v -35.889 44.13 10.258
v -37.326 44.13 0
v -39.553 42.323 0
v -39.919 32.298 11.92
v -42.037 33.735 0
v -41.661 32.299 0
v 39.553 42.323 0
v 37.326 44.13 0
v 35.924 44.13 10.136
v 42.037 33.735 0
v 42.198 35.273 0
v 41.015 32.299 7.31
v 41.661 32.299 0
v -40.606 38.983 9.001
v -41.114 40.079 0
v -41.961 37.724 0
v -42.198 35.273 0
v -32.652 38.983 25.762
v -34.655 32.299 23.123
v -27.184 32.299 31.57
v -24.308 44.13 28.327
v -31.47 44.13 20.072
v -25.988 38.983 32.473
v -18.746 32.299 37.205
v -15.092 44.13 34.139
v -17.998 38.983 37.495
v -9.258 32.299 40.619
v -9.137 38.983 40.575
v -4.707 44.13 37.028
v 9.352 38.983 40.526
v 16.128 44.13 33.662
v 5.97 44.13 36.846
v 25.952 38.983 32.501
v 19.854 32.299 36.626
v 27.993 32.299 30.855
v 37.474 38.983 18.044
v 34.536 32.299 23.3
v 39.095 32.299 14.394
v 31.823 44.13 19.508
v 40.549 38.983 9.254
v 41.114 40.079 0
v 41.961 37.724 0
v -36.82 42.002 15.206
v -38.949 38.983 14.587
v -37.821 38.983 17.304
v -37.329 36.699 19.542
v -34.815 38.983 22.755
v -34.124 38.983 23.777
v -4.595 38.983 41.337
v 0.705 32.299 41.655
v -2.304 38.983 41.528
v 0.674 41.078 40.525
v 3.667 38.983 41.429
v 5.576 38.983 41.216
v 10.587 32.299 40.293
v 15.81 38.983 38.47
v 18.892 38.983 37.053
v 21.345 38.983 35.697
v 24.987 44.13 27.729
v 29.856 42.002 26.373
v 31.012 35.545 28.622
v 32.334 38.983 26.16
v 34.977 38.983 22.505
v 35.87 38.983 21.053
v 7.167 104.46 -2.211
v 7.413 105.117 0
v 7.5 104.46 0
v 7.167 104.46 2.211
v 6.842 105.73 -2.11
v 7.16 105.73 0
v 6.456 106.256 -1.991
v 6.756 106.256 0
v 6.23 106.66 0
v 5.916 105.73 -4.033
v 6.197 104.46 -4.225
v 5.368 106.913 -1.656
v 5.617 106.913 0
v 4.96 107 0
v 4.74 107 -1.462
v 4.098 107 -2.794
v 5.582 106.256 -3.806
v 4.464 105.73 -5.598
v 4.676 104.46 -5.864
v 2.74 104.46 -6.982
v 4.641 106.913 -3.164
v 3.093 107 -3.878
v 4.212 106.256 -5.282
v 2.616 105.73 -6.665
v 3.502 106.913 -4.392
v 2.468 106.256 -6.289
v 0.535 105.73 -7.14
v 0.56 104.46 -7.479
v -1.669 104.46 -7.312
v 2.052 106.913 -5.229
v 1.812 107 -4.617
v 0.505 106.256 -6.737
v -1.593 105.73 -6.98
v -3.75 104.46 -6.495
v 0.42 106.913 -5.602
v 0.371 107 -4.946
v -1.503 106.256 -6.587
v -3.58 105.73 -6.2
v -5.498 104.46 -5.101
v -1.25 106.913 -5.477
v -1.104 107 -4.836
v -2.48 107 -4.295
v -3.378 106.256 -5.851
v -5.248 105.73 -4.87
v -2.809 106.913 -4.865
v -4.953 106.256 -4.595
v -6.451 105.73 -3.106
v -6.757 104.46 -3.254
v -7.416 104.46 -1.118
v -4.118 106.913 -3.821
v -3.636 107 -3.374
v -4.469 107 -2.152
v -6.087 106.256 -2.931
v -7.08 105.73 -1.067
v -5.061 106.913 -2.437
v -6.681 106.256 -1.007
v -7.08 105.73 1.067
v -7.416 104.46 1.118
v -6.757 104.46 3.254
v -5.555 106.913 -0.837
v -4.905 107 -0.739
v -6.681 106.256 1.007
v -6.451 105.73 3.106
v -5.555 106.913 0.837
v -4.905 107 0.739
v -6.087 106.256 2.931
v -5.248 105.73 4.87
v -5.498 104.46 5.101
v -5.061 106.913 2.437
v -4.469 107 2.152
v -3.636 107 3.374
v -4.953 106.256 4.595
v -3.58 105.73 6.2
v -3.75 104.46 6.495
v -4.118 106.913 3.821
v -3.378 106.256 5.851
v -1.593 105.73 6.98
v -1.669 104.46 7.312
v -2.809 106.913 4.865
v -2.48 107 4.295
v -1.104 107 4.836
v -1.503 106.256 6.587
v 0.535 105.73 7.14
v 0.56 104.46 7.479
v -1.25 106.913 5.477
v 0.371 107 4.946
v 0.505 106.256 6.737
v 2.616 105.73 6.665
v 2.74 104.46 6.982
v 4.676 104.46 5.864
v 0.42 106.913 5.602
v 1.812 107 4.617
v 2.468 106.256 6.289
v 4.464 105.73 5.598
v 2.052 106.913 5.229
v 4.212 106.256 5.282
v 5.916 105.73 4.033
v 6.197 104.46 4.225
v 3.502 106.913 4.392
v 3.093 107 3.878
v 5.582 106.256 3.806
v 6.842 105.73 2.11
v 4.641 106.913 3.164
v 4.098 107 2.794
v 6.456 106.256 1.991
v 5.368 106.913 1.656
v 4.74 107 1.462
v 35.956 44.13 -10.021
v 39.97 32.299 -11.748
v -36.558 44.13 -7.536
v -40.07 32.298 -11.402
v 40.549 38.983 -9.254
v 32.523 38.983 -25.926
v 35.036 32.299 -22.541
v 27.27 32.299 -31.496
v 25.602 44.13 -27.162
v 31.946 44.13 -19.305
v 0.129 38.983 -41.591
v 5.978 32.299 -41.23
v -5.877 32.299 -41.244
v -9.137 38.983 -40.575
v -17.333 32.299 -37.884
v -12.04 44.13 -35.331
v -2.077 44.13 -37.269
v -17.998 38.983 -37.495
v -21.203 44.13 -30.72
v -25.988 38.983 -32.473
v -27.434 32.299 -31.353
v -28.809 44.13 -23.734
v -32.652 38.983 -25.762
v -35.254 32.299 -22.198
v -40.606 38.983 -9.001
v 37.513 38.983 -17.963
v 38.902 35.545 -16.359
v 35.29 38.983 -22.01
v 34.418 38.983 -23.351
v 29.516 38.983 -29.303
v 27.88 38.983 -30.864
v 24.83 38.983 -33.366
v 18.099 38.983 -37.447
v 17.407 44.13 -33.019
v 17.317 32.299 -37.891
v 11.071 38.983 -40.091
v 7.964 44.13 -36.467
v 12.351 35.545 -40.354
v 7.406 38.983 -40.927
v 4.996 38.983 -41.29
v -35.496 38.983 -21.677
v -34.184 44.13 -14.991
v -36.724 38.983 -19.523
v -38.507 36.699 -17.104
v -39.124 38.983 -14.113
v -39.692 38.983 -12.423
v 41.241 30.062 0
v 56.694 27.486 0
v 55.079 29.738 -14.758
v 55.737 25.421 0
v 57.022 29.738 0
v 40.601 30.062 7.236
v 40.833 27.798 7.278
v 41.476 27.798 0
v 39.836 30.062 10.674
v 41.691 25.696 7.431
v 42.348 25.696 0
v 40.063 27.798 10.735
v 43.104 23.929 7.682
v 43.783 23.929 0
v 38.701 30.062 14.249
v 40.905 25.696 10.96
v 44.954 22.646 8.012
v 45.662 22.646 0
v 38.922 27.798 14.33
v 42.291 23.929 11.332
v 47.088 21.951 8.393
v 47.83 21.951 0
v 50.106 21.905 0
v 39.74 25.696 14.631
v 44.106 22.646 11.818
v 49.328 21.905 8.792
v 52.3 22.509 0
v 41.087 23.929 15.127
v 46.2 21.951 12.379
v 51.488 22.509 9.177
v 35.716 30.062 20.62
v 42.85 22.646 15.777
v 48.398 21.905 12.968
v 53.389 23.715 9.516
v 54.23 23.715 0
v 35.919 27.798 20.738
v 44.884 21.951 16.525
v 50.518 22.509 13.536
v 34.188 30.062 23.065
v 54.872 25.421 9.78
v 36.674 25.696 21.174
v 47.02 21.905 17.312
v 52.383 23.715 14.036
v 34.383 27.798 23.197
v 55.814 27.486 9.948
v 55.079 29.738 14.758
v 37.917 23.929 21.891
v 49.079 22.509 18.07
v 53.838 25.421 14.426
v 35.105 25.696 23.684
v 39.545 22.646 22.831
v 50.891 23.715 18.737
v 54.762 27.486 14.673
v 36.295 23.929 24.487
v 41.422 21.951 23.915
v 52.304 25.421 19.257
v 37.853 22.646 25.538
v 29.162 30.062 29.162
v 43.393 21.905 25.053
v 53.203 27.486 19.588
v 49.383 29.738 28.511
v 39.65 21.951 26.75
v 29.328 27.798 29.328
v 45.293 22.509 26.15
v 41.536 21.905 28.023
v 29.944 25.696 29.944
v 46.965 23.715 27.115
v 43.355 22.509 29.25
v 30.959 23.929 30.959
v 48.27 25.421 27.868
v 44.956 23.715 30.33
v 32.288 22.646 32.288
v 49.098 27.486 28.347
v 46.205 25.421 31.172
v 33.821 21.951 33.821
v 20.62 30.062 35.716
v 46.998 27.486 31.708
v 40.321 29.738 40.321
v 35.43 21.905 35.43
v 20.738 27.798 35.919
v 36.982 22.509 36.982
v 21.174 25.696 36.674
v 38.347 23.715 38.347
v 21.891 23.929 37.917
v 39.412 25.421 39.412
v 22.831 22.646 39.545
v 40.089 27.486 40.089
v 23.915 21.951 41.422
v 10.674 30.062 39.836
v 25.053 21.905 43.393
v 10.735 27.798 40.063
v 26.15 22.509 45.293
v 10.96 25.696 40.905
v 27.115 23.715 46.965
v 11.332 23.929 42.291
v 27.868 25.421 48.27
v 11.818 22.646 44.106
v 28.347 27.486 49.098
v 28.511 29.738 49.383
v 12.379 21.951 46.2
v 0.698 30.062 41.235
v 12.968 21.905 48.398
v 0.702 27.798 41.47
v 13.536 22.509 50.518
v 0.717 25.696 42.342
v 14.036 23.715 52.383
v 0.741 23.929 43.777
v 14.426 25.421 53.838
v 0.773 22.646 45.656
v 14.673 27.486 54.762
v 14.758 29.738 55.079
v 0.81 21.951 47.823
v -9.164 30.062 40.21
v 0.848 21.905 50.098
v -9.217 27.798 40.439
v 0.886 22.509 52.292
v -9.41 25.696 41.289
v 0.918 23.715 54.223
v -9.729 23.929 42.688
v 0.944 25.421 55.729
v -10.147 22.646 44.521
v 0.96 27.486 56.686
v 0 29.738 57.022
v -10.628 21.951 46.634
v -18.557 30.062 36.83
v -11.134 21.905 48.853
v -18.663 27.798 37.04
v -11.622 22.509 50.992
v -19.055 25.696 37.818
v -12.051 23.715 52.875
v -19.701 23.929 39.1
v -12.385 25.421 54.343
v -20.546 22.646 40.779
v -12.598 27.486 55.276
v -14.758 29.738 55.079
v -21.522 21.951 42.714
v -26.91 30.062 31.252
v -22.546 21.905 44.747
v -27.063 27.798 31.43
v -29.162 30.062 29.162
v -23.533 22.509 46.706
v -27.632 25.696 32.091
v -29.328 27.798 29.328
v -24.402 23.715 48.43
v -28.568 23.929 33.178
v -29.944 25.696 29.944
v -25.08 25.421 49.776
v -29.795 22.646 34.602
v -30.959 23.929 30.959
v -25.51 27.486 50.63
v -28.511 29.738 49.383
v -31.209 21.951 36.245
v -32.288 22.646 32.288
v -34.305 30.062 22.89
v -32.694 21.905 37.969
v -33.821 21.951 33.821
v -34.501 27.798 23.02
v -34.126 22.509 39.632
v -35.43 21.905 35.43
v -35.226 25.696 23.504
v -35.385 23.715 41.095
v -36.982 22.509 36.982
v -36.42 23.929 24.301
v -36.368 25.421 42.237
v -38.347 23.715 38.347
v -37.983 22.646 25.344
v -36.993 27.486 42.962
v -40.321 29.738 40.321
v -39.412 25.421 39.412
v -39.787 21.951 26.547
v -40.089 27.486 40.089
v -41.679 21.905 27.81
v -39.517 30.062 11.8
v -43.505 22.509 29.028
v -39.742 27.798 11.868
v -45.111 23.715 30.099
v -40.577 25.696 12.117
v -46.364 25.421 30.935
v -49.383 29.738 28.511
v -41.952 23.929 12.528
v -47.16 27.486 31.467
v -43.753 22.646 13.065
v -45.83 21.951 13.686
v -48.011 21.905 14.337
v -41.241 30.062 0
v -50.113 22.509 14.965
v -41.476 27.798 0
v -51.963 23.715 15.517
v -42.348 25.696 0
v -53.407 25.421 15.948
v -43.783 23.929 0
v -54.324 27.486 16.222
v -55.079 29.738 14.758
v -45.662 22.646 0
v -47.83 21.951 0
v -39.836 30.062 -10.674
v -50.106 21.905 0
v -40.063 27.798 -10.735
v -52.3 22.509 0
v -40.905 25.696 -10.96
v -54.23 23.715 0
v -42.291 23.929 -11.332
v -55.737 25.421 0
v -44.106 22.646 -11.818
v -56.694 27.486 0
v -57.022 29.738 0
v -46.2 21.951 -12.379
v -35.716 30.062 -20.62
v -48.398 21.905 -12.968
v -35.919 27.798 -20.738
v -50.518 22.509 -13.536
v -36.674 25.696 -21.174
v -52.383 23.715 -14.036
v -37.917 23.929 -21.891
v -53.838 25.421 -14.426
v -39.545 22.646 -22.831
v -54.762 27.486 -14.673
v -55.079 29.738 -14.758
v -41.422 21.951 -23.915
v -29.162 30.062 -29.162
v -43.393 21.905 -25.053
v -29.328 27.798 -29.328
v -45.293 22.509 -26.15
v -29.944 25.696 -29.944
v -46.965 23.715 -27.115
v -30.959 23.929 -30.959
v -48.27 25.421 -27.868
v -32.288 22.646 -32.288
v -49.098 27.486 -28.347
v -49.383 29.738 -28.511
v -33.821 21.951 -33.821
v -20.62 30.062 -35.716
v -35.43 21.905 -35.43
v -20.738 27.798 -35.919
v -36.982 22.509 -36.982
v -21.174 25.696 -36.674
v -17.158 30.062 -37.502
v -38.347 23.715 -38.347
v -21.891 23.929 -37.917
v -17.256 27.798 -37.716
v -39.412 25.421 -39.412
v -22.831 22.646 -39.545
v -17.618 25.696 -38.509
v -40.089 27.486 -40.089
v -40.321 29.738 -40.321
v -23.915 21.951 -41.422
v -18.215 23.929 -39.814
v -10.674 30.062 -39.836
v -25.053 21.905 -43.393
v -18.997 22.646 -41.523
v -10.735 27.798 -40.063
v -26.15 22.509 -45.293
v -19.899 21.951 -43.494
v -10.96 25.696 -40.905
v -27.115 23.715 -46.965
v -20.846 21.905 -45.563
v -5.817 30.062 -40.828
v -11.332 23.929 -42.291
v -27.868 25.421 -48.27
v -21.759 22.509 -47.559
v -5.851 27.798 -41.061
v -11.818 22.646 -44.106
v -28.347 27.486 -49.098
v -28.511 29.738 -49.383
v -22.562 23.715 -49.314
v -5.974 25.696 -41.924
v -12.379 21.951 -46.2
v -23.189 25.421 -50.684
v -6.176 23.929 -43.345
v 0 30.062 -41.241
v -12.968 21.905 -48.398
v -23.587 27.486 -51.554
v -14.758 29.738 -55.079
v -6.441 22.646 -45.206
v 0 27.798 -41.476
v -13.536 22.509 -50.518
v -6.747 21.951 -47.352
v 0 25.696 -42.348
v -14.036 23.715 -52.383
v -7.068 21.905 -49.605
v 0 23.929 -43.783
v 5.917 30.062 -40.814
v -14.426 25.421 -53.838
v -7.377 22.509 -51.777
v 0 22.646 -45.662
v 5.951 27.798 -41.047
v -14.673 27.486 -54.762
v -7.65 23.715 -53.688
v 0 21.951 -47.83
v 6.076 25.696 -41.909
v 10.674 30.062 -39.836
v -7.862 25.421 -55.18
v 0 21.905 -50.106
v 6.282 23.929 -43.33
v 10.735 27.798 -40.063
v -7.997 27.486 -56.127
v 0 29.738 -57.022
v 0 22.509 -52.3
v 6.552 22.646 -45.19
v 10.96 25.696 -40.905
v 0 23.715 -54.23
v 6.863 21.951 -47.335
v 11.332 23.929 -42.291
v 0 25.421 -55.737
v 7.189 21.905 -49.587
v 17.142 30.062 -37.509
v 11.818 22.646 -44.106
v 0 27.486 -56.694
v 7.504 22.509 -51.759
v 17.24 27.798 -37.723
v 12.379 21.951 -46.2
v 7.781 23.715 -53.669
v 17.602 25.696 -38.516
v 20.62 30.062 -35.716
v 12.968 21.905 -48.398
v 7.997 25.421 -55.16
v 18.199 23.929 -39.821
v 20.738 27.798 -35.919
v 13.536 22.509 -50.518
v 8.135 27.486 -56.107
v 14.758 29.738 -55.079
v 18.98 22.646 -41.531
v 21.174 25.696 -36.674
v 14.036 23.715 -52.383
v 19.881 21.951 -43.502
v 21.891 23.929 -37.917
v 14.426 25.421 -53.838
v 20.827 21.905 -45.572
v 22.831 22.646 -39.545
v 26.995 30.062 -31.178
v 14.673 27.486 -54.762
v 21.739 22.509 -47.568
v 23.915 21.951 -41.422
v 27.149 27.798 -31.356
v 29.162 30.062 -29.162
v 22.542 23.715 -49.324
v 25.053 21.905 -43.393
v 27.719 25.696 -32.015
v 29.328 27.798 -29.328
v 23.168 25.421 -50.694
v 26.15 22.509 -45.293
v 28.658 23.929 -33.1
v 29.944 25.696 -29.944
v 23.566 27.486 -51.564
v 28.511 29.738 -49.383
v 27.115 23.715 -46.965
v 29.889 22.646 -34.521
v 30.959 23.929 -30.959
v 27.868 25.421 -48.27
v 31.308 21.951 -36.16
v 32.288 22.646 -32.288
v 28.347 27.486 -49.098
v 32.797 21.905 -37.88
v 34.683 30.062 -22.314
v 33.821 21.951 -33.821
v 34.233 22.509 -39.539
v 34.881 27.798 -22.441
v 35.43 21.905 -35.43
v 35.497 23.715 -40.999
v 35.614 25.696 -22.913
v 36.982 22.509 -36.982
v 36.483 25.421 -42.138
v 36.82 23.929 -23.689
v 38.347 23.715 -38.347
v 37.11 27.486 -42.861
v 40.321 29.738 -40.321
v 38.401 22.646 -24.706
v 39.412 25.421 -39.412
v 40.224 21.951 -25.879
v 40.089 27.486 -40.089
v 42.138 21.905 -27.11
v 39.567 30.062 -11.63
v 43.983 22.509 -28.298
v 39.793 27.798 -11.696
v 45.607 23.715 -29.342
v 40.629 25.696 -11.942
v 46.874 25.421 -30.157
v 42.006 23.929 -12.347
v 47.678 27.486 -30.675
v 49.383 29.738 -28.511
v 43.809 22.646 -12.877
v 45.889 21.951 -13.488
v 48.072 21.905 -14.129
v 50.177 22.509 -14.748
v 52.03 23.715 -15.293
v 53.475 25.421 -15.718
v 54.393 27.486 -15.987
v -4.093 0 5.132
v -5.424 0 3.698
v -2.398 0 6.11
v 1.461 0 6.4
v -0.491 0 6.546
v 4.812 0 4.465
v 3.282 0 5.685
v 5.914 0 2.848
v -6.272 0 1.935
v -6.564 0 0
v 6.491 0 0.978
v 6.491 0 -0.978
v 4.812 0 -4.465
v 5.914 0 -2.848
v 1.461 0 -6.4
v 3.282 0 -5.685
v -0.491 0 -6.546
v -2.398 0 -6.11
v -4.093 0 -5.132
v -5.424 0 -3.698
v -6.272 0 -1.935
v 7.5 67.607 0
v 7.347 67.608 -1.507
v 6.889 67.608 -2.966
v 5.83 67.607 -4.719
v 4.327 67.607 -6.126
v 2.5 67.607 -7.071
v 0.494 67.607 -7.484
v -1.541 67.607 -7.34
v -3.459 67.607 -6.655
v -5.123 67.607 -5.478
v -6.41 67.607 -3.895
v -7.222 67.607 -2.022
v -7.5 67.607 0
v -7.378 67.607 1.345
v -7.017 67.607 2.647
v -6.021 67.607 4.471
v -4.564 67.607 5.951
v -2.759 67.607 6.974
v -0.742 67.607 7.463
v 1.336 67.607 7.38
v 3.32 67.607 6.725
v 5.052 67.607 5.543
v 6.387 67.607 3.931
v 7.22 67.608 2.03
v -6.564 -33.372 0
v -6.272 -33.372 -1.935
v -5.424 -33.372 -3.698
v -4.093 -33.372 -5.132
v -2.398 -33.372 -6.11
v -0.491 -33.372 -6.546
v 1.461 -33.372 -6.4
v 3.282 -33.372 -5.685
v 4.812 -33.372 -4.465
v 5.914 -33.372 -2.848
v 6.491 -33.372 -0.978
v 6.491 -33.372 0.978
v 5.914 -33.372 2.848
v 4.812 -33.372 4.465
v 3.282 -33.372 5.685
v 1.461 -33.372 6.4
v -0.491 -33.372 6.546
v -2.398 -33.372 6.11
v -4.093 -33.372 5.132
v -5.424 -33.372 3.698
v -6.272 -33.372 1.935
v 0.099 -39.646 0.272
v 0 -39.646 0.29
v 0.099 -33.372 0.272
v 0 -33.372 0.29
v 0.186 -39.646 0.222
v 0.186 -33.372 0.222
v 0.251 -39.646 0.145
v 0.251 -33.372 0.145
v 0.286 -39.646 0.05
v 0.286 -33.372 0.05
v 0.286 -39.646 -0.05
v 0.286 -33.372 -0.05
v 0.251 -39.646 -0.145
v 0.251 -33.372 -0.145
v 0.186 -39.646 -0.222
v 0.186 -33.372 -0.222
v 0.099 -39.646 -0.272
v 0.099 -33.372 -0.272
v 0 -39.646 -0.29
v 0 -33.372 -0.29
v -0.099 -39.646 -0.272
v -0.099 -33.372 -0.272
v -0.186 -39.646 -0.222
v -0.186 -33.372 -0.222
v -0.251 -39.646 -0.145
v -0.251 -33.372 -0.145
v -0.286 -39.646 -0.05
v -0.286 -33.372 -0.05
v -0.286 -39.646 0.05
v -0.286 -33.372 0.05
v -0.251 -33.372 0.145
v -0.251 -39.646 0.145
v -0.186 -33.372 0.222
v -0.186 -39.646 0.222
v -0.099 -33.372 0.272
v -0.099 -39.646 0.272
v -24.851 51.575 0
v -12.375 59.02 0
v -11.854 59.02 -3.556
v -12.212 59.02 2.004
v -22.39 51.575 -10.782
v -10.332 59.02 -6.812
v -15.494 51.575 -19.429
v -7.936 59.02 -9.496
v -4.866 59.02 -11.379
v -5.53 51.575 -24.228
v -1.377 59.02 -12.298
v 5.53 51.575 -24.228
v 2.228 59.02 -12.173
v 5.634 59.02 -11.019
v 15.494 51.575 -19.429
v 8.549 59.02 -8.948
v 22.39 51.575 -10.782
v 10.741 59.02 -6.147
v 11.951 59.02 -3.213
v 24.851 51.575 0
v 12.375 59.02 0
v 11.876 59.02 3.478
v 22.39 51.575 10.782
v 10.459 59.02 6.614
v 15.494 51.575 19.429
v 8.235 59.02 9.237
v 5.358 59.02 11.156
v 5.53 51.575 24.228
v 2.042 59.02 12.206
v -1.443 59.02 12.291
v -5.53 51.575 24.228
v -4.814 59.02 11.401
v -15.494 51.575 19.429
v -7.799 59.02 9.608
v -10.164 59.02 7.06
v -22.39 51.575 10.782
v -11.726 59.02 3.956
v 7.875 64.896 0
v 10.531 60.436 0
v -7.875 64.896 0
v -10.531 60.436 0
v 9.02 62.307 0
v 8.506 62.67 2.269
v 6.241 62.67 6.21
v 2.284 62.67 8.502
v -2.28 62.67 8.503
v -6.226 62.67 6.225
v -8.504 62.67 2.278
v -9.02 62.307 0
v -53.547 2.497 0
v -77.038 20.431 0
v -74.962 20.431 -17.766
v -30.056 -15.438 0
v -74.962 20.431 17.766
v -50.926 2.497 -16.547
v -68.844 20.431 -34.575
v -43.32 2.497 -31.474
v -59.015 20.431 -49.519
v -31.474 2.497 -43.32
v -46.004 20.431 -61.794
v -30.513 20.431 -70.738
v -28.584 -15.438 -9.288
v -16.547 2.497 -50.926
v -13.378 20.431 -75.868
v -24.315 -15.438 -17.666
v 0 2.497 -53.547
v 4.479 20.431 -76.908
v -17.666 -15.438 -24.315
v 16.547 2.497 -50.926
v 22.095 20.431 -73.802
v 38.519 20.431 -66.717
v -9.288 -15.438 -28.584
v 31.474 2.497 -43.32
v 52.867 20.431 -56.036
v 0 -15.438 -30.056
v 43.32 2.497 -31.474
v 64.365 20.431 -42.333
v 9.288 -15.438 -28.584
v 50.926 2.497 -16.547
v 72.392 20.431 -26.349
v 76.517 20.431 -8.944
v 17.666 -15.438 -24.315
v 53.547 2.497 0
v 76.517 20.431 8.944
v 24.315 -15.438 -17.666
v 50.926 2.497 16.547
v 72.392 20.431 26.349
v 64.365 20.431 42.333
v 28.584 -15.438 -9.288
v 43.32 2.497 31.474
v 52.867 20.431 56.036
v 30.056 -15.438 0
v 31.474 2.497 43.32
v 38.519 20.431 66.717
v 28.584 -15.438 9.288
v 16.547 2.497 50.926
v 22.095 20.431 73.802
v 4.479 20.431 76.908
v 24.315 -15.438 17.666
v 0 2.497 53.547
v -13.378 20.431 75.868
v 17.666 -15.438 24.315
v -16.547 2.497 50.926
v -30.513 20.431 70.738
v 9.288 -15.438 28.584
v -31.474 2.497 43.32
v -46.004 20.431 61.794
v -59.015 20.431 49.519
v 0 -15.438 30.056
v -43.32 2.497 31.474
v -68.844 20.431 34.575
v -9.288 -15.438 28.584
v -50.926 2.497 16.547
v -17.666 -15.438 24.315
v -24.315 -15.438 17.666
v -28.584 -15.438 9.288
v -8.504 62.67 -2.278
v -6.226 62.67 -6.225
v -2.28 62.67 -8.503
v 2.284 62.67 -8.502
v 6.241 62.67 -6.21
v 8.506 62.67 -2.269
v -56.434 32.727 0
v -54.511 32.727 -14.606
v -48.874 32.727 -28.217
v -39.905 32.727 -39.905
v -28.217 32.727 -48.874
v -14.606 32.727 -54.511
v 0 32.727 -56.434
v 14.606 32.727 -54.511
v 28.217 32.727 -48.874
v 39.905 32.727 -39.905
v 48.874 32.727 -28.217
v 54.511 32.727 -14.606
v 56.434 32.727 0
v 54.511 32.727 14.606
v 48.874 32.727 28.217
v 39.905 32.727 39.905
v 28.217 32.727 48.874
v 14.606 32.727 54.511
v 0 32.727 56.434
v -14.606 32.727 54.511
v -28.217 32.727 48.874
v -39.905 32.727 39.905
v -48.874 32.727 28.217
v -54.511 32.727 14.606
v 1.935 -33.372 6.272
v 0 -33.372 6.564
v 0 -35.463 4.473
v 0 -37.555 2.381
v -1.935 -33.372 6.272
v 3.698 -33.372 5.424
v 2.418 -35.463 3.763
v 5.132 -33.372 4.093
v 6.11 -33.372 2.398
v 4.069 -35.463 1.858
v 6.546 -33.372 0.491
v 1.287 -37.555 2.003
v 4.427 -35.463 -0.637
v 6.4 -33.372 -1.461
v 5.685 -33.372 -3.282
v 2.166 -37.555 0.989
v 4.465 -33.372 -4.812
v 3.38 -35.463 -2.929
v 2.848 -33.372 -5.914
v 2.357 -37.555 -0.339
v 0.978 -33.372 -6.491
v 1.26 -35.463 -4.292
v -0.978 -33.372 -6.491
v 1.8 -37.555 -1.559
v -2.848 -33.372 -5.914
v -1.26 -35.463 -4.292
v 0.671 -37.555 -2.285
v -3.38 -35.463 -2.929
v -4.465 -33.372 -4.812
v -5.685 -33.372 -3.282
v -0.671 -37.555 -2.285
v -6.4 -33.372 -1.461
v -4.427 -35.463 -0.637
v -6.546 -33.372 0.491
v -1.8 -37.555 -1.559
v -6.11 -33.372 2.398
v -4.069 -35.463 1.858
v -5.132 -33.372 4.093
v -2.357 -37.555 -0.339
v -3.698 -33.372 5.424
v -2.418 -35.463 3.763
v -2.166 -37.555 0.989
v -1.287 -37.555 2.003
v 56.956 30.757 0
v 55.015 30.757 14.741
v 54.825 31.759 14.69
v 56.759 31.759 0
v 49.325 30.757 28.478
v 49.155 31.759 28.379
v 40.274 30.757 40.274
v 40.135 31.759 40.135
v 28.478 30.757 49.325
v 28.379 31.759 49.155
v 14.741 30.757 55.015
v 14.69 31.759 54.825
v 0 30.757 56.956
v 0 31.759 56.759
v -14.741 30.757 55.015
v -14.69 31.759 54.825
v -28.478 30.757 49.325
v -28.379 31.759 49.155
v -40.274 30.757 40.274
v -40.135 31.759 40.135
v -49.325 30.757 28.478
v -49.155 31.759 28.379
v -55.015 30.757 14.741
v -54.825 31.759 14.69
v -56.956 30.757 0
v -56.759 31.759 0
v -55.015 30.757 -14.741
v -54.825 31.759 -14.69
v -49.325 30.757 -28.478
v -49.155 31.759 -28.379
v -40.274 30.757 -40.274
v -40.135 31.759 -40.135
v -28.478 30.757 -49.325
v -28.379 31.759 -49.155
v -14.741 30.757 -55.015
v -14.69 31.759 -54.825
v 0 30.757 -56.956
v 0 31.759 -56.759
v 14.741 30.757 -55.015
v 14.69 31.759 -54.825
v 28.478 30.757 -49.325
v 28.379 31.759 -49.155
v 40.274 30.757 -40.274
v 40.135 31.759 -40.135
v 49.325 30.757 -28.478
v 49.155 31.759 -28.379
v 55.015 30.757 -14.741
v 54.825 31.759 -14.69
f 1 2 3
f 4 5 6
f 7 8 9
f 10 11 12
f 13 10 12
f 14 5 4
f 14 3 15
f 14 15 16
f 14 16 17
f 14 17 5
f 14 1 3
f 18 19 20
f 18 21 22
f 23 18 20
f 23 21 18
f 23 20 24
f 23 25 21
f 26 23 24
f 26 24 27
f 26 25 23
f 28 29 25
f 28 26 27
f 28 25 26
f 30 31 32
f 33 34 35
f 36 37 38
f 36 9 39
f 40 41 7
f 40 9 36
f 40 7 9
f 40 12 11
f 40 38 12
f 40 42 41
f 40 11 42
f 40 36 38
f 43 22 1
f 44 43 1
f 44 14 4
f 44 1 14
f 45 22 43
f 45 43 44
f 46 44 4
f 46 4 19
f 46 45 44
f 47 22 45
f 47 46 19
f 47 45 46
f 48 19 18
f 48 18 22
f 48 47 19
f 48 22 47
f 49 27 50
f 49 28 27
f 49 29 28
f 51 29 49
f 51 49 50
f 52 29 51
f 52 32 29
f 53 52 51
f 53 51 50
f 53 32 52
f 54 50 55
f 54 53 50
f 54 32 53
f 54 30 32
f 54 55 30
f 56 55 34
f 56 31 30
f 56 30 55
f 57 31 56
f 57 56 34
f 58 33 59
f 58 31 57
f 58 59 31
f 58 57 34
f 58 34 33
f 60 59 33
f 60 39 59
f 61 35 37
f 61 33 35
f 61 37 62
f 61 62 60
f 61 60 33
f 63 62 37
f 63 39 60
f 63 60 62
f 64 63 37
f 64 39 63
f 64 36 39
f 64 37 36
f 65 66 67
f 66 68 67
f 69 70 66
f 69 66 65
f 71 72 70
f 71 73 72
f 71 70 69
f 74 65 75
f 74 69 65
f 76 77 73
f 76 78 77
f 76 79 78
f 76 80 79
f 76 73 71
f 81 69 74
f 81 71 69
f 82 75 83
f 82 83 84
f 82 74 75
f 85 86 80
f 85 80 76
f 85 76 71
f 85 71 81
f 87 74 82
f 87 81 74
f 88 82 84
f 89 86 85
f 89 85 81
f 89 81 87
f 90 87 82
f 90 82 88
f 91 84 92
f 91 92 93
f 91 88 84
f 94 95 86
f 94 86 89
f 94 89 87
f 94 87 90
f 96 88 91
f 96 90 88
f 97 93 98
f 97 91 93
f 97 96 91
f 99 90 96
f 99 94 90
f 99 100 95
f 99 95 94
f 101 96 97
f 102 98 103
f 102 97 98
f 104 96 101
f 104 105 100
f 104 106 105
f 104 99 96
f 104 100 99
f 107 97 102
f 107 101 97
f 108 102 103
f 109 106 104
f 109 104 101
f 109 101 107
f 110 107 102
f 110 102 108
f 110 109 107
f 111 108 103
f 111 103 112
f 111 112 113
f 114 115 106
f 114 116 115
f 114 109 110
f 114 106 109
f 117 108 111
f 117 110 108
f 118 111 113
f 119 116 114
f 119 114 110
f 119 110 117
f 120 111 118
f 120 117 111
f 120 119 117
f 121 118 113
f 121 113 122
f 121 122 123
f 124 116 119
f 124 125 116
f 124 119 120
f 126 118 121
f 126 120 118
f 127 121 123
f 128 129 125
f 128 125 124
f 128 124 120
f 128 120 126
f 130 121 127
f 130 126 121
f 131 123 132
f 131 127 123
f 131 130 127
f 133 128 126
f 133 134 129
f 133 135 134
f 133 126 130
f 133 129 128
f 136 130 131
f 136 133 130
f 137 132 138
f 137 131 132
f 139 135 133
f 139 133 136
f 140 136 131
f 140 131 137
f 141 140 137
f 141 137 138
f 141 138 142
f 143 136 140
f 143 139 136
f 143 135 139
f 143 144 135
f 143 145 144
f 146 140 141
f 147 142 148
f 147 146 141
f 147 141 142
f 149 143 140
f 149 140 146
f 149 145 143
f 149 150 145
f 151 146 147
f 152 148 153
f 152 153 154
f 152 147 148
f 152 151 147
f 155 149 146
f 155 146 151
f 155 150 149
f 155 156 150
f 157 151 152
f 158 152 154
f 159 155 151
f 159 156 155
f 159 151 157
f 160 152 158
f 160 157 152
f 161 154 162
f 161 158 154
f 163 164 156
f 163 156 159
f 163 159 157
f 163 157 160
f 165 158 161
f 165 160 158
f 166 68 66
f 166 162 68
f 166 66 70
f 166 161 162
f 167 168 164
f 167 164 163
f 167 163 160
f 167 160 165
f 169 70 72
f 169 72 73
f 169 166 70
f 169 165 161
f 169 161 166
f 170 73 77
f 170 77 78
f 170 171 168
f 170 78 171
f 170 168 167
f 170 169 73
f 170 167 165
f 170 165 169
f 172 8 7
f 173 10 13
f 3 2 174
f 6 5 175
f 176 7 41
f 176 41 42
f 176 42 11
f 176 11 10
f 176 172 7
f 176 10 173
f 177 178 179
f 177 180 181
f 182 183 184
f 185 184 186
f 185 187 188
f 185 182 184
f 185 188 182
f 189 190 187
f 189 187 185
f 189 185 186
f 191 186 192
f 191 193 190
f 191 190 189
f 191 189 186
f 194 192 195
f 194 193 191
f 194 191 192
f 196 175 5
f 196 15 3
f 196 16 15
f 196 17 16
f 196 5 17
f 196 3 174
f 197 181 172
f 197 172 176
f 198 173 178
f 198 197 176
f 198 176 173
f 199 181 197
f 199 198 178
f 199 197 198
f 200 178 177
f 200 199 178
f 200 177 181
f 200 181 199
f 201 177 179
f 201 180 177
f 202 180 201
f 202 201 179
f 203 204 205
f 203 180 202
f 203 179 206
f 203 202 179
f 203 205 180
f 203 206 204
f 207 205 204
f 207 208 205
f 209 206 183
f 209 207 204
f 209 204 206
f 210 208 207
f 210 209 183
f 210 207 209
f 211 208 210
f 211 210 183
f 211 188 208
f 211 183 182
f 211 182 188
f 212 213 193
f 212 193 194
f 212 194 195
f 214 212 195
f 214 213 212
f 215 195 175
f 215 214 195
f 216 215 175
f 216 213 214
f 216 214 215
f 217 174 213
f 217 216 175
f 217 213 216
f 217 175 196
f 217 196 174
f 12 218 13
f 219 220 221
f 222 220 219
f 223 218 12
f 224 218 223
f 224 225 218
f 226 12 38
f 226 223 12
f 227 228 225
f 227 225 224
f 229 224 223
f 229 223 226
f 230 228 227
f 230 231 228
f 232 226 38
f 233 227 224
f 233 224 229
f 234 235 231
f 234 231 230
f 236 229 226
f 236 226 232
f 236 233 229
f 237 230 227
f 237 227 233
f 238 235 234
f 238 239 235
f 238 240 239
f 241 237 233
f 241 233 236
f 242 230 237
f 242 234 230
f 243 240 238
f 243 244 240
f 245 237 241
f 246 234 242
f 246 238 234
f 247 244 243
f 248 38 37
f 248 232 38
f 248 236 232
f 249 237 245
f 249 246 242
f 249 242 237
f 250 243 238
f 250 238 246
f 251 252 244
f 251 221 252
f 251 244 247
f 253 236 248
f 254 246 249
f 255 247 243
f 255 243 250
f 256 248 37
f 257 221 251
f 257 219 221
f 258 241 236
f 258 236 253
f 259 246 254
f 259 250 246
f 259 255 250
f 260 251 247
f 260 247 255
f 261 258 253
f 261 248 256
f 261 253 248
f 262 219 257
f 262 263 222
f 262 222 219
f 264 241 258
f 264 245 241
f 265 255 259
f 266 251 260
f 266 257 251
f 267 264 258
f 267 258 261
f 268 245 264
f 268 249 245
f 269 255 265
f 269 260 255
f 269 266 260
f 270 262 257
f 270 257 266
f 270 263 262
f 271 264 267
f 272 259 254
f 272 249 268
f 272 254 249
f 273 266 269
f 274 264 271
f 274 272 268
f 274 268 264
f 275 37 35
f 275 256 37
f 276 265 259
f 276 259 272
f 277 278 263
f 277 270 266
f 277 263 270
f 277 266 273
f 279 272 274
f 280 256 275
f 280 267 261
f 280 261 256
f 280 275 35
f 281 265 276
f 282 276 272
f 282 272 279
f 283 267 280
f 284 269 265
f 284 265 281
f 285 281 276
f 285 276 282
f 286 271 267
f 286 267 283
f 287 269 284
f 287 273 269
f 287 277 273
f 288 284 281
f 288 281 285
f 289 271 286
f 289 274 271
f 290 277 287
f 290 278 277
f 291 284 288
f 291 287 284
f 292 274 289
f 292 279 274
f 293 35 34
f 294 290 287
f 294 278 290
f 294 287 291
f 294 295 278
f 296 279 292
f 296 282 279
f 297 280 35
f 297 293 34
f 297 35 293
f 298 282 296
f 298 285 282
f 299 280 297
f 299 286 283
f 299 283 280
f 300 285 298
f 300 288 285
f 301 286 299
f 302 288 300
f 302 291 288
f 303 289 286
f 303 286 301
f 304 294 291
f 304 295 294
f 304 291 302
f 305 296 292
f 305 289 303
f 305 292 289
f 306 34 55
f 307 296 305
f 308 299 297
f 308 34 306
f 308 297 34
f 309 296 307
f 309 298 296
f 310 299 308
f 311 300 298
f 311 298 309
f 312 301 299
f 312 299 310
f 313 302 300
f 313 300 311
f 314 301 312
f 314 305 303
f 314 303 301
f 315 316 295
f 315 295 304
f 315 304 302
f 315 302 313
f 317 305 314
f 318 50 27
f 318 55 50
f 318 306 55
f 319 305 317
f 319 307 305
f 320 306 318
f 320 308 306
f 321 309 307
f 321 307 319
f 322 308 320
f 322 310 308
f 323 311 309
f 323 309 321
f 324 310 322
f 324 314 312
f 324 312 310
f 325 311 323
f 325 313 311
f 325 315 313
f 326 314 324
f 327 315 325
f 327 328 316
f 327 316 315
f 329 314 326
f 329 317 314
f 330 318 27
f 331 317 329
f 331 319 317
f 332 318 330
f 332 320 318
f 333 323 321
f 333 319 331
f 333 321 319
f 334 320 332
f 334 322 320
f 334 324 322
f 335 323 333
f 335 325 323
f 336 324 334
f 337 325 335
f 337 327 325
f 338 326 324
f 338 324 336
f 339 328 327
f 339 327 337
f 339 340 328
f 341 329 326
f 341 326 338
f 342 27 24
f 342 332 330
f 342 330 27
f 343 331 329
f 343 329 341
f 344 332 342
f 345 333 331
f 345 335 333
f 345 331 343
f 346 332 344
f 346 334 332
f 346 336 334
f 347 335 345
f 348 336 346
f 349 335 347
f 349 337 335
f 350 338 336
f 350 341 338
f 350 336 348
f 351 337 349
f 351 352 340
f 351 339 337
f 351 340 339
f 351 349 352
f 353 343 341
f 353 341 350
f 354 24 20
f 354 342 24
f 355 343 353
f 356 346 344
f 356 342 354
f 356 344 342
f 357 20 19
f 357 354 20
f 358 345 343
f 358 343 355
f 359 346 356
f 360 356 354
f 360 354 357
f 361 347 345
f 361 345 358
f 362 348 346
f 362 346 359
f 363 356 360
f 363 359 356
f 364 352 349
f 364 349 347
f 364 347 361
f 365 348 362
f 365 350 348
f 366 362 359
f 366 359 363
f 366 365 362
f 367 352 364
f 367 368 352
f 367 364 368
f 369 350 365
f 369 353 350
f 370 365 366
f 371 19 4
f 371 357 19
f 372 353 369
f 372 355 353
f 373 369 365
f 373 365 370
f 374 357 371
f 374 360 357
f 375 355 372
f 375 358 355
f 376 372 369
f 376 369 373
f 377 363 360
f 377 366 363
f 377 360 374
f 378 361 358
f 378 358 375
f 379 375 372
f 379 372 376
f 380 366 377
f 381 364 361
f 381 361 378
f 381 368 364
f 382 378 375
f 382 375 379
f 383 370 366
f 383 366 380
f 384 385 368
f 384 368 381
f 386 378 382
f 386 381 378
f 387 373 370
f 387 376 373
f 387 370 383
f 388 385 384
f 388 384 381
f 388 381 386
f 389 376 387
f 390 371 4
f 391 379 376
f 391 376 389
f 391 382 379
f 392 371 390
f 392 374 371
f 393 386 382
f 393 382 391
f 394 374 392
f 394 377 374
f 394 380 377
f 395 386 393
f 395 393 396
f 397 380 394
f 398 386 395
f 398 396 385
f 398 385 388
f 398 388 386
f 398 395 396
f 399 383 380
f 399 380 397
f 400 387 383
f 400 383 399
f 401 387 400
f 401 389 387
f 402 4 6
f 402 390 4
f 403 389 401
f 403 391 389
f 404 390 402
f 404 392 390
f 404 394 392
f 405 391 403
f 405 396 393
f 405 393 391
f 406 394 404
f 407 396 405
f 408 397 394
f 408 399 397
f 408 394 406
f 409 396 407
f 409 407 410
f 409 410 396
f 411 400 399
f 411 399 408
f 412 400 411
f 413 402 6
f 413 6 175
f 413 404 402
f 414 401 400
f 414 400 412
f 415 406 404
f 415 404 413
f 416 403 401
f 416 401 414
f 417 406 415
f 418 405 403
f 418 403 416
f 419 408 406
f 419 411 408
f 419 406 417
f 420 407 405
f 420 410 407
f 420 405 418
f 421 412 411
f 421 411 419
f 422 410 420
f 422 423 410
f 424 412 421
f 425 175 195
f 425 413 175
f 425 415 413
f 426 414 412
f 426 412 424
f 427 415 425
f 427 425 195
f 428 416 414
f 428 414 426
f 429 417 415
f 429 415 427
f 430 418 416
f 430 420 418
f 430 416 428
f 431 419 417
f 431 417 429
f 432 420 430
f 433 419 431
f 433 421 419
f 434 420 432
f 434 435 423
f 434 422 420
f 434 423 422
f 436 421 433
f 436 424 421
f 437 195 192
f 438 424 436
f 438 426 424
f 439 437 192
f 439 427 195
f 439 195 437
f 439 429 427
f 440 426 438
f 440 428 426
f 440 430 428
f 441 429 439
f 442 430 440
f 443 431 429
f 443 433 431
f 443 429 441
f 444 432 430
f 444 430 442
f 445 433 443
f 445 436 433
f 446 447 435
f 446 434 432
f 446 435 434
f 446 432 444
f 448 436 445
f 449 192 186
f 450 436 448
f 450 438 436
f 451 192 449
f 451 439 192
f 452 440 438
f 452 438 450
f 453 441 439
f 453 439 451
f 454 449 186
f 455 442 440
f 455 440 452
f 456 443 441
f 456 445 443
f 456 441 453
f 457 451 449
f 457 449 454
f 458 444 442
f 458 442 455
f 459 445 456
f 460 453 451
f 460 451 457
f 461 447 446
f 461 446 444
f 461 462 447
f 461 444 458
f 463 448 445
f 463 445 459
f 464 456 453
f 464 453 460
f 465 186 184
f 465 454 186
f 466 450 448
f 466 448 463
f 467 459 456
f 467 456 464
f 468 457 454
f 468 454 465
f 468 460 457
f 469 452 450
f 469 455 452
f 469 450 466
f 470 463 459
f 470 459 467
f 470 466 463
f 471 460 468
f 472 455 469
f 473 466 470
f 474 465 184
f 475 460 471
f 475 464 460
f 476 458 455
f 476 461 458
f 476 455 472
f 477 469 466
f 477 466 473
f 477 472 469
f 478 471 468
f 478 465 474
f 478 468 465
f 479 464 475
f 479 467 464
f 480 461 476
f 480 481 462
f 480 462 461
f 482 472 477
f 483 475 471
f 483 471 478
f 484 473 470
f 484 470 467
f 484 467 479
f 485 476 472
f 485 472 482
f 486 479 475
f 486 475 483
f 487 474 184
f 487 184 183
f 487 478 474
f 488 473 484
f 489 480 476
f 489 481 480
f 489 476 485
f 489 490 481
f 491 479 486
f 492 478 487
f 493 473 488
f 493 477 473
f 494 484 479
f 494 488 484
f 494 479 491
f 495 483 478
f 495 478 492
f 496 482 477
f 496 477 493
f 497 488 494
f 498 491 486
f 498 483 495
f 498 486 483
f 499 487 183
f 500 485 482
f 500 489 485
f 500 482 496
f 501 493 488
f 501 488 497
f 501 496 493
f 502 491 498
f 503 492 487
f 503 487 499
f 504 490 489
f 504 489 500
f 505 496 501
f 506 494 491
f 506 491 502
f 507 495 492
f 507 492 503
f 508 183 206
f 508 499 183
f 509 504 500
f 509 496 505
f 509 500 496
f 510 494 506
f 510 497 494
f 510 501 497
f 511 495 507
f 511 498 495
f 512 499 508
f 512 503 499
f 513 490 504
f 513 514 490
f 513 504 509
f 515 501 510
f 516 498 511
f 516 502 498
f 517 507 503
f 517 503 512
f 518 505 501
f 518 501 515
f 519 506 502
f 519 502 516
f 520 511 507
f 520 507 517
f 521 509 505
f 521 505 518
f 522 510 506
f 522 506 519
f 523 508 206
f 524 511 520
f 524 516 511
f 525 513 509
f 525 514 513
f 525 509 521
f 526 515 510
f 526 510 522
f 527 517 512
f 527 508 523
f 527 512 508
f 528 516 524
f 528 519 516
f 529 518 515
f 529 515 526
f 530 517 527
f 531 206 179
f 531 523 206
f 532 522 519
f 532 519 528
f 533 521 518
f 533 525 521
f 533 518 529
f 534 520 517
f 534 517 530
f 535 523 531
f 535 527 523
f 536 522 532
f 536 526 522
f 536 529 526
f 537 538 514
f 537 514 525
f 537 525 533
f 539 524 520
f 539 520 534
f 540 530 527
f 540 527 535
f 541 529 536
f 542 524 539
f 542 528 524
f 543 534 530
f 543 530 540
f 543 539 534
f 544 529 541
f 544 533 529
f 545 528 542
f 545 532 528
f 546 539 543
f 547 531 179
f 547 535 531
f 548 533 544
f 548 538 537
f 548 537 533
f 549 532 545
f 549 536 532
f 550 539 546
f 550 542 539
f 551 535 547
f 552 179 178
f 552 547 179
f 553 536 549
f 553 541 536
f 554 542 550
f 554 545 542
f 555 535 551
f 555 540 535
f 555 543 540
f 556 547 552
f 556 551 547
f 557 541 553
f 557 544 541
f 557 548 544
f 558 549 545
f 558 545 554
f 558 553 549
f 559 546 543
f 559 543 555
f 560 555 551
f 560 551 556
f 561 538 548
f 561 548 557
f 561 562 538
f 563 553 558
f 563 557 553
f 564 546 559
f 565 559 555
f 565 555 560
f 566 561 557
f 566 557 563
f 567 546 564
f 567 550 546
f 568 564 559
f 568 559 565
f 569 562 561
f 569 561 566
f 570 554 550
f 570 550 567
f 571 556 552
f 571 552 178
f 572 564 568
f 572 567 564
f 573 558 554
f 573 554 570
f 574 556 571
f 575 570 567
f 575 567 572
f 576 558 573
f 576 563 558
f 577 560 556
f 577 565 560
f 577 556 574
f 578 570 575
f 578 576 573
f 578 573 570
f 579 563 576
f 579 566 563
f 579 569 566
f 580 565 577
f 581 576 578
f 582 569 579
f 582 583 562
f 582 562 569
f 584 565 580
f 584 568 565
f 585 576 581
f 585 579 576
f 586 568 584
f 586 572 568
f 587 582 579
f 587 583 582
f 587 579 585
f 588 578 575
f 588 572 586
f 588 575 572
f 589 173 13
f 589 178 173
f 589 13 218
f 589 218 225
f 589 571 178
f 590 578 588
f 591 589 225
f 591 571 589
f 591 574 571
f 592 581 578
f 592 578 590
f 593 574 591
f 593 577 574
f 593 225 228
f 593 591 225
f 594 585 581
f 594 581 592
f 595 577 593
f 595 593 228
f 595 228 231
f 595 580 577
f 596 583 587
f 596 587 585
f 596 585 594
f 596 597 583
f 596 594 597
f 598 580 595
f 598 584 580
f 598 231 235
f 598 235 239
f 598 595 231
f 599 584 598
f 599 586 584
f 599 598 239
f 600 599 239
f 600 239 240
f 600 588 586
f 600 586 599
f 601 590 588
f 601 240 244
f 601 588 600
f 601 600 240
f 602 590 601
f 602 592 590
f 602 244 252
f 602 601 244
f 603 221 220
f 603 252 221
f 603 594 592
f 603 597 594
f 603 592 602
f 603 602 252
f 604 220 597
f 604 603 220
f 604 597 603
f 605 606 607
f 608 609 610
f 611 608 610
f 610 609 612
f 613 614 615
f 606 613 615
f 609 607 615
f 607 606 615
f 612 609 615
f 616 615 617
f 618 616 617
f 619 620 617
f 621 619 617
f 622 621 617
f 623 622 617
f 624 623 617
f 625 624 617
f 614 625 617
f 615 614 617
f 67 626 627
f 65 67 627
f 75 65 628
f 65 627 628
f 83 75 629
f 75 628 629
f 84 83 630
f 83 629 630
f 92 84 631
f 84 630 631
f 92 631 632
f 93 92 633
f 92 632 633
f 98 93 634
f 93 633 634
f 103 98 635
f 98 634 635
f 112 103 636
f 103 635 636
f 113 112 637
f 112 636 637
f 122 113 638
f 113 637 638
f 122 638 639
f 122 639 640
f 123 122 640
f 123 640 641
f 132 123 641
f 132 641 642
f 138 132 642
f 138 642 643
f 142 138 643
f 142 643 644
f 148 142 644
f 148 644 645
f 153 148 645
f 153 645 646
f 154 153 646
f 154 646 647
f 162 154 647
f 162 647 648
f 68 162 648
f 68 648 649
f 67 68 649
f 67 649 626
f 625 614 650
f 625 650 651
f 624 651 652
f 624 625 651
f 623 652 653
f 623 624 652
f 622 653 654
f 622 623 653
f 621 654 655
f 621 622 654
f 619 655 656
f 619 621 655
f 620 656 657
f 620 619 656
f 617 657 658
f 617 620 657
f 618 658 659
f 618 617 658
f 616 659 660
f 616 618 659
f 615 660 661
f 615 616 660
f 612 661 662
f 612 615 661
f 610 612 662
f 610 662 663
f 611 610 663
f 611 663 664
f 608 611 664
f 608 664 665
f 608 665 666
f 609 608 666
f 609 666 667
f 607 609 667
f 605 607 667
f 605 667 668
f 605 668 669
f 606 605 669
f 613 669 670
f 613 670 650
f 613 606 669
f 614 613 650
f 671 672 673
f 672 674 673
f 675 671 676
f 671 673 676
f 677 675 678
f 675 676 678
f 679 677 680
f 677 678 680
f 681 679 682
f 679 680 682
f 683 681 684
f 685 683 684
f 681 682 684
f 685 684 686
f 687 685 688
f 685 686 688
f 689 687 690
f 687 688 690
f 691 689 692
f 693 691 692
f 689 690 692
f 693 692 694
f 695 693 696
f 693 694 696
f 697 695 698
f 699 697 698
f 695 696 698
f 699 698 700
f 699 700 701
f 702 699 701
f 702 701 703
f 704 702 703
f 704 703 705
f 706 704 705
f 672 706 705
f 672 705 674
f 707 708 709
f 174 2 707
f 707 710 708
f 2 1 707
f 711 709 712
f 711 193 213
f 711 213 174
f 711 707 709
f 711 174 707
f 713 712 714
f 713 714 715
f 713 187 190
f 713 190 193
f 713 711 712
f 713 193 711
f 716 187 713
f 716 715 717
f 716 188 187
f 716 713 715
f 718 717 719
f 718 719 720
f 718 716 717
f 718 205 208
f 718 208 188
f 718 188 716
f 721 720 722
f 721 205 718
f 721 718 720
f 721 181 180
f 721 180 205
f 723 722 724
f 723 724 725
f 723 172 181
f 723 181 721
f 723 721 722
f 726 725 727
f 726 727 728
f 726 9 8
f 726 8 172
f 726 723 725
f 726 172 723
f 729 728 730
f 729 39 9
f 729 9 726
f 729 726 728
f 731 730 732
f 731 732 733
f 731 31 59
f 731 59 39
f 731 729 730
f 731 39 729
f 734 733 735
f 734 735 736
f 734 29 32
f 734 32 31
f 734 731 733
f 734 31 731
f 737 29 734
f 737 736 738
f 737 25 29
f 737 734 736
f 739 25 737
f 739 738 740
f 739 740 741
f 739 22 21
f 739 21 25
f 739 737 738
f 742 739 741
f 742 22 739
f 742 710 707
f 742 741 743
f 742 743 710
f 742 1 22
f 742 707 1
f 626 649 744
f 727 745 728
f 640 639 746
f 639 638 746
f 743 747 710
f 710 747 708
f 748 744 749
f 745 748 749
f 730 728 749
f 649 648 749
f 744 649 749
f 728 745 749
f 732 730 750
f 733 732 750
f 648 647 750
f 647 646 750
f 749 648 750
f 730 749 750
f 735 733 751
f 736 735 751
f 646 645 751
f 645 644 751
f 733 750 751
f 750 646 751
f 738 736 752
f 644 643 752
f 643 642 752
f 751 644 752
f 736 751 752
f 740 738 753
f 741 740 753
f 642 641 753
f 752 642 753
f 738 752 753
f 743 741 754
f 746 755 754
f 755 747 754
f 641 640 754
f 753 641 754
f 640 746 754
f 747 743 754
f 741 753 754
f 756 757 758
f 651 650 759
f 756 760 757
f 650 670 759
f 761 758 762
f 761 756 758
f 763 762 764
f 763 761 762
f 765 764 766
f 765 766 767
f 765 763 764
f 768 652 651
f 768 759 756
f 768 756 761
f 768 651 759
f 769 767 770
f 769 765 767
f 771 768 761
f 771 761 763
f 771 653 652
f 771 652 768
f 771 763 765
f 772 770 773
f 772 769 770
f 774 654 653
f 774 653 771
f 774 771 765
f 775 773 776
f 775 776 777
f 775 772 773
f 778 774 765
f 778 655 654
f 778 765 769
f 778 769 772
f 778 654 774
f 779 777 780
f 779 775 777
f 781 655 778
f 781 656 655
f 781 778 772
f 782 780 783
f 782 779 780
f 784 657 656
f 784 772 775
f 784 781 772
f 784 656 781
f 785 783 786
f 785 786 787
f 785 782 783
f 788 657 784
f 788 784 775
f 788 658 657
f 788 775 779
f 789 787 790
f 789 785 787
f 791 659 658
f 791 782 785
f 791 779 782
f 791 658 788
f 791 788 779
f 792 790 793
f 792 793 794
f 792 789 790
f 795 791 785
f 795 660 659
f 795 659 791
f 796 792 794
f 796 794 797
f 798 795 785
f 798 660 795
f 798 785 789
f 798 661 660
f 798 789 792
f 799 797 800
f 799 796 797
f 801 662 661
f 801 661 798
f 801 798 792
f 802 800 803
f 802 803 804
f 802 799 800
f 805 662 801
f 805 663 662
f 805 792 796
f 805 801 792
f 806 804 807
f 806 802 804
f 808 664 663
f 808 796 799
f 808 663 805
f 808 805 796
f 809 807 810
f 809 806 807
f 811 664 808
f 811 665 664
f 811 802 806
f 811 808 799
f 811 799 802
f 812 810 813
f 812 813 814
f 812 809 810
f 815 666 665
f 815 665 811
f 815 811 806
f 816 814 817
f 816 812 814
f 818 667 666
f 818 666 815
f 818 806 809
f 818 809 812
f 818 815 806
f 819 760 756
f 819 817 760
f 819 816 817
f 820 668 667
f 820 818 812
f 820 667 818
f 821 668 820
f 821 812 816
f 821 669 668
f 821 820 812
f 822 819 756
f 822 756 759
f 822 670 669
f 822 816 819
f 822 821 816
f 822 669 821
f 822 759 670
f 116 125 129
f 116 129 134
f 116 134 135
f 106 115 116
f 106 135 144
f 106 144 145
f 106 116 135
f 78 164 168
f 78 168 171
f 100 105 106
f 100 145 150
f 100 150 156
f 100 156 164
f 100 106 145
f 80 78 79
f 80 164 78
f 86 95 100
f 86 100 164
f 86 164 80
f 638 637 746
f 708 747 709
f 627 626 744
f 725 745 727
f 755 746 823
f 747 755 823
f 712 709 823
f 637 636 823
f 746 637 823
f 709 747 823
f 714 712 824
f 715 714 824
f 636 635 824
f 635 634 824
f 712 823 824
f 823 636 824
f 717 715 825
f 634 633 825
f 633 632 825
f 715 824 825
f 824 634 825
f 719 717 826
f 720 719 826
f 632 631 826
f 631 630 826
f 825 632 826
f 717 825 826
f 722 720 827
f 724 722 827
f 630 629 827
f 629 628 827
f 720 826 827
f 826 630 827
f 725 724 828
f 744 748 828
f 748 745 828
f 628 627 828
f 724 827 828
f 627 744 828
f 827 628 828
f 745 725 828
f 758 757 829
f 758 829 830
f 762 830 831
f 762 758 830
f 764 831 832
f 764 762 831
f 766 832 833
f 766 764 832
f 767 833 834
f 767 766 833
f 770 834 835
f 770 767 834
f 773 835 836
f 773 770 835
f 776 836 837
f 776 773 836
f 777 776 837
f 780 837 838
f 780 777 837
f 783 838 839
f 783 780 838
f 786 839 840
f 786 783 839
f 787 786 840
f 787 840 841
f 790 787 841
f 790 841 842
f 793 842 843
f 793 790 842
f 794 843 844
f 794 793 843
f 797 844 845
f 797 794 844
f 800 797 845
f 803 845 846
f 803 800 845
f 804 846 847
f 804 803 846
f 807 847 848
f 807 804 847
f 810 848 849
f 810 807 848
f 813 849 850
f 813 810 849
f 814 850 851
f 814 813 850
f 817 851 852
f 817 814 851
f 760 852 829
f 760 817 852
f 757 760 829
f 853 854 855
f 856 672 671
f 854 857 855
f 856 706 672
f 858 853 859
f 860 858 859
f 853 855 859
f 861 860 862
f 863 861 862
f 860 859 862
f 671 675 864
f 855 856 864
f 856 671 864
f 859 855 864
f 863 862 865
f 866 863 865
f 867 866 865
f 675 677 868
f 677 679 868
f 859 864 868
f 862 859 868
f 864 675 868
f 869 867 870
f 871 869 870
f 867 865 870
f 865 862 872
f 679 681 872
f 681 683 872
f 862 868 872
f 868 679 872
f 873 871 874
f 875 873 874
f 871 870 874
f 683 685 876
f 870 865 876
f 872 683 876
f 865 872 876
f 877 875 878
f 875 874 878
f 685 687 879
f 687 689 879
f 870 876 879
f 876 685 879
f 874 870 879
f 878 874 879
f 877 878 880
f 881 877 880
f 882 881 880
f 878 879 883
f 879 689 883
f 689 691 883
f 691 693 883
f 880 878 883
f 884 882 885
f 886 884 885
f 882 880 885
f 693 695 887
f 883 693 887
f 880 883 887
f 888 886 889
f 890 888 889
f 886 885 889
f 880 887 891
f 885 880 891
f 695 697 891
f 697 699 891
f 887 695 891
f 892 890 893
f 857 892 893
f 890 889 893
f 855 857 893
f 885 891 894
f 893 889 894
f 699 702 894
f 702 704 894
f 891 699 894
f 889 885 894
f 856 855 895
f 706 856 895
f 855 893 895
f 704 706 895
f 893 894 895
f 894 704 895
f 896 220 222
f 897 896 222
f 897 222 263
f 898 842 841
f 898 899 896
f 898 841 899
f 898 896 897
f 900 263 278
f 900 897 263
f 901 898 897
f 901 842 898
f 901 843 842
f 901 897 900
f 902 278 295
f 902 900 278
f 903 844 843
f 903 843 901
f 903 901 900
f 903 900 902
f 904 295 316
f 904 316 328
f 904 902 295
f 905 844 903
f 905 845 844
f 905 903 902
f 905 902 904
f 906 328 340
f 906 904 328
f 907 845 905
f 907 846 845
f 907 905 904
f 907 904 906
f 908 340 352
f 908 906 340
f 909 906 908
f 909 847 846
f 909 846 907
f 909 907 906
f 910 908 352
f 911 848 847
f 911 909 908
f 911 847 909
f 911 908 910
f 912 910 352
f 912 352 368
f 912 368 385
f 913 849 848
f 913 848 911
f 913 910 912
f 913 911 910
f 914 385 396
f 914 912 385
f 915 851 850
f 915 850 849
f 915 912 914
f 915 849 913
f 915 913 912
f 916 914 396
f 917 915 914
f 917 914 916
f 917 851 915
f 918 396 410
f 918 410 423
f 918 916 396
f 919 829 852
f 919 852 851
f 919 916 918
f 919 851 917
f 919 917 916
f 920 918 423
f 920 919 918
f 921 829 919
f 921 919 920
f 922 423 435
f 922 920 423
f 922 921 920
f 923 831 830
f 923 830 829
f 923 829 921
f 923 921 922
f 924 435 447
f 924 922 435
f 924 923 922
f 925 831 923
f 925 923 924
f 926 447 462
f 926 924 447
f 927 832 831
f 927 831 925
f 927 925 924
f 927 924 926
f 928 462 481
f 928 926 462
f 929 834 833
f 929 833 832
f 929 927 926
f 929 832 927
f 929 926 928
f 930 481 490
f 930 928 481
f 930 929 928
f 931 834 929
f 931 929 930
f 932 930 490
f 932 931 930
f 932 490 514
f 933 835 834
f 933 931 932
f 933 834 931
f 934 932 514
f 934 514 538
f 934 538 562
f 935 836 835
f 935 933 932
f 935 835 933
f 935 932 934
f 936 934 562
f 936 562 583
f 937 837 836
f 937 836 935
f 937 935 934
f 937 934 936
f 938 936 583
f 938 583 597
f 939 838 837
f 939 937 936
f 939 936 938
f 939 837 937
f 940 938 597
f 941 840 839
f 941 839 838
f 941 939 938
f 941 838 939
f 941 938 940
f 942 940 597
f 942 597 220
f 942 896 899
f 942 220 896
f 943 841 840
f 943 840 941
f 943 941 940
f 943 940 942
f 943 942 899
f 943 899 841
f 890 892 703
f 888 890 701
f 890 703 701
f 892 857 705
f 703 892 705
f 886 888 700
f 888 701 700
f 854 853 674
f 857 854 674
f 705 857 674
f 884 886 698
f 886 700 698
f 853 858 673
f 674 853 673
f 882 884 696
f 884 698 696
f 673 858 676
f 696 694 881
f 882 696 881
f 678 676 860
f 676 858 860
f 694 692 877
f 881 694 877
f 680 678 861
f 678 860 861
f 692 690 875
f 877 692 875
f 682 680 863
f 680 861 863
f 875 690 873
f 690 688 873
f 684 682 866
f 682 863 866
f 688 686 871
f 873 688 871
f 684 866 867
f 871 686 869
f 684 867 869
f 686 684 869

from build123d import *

# Parameters (mm, degrees)
SKETCH4_R           = 7.5
BOSS_EXTRUDE1_DEPTH = 107
SKETCH8_ONE_SIDE_R  = 7.89395432
FILLET1_R           = 10
FILLET4_R           = 2.54


with BuildPart() as part:
    # Sketch1 → Revolve1 (revolve)
    with BuildSketch(Plane.XY):
        Polygon((-6.564094159, 62.488224309), (-77.038318905, 20.431025671), (-6.564094159, -33.371877092), align=None)
    revolve(axis=Axis((0, 89.787897782, 0), (0, -1, 0)))

    # Sketch4 → Boss-Extrude1 (add)
    with BuildSketch(Plane(origin=(0, 0, 0), x_dir=(1, 0, 0), z_dir=(0, 1, 0))):
        Circle(SKETCH4_R)
    extrude(amount=BOSS_EXTRUDE1_DEPTH)

    # Sketch8 one side → Cut-Revolve1 (revolve, cut)
    with BuildSketch(Plane.XY):
        with Locations((49.128074223, 29.737990358)):
            Circle(SKETCH8_ONE_SIDE_R)
    revolve(axis=Axis((0, 59.501993736, 0), (0, -1, 0)), mode=Mode.SUBTRACT)

    # Fillet1
    fillet1_edges = [part.edges().sort_by_distance(p)[0] for p in [
        (0, 37.587323222, -48.289928414),
        (0, 61.929699856, -7.5),
    ]]
    fillet(fillet1_edges, radius=FILLET1_R)

    # Fillet4
    fillet4_edges = [part.edges().sort_by_distance(p)[0] for p in [
        (-7.5, 107, 0),
    ]]
    fillet(fillet4_edges, radius=FILLET4_R)


with BuildPart() as body_2:
    # Sketch7 → Revolve2 (revolve)
    with BuildSketch(Plane(origin=(0, 0, 0), x_dir=(0, 0, -1), z_dir=(1, 0, 0))):
        Polygon((-6.564094159, -33.371877092), (-0.289913468, -39.646057783), (-0.289913468, -33.371877092), align=None)
    revolve(axis=Axis((0, -49.303627639, 0), (0, 1, 0)))


solid = Compound([part.part, body_2.part])
